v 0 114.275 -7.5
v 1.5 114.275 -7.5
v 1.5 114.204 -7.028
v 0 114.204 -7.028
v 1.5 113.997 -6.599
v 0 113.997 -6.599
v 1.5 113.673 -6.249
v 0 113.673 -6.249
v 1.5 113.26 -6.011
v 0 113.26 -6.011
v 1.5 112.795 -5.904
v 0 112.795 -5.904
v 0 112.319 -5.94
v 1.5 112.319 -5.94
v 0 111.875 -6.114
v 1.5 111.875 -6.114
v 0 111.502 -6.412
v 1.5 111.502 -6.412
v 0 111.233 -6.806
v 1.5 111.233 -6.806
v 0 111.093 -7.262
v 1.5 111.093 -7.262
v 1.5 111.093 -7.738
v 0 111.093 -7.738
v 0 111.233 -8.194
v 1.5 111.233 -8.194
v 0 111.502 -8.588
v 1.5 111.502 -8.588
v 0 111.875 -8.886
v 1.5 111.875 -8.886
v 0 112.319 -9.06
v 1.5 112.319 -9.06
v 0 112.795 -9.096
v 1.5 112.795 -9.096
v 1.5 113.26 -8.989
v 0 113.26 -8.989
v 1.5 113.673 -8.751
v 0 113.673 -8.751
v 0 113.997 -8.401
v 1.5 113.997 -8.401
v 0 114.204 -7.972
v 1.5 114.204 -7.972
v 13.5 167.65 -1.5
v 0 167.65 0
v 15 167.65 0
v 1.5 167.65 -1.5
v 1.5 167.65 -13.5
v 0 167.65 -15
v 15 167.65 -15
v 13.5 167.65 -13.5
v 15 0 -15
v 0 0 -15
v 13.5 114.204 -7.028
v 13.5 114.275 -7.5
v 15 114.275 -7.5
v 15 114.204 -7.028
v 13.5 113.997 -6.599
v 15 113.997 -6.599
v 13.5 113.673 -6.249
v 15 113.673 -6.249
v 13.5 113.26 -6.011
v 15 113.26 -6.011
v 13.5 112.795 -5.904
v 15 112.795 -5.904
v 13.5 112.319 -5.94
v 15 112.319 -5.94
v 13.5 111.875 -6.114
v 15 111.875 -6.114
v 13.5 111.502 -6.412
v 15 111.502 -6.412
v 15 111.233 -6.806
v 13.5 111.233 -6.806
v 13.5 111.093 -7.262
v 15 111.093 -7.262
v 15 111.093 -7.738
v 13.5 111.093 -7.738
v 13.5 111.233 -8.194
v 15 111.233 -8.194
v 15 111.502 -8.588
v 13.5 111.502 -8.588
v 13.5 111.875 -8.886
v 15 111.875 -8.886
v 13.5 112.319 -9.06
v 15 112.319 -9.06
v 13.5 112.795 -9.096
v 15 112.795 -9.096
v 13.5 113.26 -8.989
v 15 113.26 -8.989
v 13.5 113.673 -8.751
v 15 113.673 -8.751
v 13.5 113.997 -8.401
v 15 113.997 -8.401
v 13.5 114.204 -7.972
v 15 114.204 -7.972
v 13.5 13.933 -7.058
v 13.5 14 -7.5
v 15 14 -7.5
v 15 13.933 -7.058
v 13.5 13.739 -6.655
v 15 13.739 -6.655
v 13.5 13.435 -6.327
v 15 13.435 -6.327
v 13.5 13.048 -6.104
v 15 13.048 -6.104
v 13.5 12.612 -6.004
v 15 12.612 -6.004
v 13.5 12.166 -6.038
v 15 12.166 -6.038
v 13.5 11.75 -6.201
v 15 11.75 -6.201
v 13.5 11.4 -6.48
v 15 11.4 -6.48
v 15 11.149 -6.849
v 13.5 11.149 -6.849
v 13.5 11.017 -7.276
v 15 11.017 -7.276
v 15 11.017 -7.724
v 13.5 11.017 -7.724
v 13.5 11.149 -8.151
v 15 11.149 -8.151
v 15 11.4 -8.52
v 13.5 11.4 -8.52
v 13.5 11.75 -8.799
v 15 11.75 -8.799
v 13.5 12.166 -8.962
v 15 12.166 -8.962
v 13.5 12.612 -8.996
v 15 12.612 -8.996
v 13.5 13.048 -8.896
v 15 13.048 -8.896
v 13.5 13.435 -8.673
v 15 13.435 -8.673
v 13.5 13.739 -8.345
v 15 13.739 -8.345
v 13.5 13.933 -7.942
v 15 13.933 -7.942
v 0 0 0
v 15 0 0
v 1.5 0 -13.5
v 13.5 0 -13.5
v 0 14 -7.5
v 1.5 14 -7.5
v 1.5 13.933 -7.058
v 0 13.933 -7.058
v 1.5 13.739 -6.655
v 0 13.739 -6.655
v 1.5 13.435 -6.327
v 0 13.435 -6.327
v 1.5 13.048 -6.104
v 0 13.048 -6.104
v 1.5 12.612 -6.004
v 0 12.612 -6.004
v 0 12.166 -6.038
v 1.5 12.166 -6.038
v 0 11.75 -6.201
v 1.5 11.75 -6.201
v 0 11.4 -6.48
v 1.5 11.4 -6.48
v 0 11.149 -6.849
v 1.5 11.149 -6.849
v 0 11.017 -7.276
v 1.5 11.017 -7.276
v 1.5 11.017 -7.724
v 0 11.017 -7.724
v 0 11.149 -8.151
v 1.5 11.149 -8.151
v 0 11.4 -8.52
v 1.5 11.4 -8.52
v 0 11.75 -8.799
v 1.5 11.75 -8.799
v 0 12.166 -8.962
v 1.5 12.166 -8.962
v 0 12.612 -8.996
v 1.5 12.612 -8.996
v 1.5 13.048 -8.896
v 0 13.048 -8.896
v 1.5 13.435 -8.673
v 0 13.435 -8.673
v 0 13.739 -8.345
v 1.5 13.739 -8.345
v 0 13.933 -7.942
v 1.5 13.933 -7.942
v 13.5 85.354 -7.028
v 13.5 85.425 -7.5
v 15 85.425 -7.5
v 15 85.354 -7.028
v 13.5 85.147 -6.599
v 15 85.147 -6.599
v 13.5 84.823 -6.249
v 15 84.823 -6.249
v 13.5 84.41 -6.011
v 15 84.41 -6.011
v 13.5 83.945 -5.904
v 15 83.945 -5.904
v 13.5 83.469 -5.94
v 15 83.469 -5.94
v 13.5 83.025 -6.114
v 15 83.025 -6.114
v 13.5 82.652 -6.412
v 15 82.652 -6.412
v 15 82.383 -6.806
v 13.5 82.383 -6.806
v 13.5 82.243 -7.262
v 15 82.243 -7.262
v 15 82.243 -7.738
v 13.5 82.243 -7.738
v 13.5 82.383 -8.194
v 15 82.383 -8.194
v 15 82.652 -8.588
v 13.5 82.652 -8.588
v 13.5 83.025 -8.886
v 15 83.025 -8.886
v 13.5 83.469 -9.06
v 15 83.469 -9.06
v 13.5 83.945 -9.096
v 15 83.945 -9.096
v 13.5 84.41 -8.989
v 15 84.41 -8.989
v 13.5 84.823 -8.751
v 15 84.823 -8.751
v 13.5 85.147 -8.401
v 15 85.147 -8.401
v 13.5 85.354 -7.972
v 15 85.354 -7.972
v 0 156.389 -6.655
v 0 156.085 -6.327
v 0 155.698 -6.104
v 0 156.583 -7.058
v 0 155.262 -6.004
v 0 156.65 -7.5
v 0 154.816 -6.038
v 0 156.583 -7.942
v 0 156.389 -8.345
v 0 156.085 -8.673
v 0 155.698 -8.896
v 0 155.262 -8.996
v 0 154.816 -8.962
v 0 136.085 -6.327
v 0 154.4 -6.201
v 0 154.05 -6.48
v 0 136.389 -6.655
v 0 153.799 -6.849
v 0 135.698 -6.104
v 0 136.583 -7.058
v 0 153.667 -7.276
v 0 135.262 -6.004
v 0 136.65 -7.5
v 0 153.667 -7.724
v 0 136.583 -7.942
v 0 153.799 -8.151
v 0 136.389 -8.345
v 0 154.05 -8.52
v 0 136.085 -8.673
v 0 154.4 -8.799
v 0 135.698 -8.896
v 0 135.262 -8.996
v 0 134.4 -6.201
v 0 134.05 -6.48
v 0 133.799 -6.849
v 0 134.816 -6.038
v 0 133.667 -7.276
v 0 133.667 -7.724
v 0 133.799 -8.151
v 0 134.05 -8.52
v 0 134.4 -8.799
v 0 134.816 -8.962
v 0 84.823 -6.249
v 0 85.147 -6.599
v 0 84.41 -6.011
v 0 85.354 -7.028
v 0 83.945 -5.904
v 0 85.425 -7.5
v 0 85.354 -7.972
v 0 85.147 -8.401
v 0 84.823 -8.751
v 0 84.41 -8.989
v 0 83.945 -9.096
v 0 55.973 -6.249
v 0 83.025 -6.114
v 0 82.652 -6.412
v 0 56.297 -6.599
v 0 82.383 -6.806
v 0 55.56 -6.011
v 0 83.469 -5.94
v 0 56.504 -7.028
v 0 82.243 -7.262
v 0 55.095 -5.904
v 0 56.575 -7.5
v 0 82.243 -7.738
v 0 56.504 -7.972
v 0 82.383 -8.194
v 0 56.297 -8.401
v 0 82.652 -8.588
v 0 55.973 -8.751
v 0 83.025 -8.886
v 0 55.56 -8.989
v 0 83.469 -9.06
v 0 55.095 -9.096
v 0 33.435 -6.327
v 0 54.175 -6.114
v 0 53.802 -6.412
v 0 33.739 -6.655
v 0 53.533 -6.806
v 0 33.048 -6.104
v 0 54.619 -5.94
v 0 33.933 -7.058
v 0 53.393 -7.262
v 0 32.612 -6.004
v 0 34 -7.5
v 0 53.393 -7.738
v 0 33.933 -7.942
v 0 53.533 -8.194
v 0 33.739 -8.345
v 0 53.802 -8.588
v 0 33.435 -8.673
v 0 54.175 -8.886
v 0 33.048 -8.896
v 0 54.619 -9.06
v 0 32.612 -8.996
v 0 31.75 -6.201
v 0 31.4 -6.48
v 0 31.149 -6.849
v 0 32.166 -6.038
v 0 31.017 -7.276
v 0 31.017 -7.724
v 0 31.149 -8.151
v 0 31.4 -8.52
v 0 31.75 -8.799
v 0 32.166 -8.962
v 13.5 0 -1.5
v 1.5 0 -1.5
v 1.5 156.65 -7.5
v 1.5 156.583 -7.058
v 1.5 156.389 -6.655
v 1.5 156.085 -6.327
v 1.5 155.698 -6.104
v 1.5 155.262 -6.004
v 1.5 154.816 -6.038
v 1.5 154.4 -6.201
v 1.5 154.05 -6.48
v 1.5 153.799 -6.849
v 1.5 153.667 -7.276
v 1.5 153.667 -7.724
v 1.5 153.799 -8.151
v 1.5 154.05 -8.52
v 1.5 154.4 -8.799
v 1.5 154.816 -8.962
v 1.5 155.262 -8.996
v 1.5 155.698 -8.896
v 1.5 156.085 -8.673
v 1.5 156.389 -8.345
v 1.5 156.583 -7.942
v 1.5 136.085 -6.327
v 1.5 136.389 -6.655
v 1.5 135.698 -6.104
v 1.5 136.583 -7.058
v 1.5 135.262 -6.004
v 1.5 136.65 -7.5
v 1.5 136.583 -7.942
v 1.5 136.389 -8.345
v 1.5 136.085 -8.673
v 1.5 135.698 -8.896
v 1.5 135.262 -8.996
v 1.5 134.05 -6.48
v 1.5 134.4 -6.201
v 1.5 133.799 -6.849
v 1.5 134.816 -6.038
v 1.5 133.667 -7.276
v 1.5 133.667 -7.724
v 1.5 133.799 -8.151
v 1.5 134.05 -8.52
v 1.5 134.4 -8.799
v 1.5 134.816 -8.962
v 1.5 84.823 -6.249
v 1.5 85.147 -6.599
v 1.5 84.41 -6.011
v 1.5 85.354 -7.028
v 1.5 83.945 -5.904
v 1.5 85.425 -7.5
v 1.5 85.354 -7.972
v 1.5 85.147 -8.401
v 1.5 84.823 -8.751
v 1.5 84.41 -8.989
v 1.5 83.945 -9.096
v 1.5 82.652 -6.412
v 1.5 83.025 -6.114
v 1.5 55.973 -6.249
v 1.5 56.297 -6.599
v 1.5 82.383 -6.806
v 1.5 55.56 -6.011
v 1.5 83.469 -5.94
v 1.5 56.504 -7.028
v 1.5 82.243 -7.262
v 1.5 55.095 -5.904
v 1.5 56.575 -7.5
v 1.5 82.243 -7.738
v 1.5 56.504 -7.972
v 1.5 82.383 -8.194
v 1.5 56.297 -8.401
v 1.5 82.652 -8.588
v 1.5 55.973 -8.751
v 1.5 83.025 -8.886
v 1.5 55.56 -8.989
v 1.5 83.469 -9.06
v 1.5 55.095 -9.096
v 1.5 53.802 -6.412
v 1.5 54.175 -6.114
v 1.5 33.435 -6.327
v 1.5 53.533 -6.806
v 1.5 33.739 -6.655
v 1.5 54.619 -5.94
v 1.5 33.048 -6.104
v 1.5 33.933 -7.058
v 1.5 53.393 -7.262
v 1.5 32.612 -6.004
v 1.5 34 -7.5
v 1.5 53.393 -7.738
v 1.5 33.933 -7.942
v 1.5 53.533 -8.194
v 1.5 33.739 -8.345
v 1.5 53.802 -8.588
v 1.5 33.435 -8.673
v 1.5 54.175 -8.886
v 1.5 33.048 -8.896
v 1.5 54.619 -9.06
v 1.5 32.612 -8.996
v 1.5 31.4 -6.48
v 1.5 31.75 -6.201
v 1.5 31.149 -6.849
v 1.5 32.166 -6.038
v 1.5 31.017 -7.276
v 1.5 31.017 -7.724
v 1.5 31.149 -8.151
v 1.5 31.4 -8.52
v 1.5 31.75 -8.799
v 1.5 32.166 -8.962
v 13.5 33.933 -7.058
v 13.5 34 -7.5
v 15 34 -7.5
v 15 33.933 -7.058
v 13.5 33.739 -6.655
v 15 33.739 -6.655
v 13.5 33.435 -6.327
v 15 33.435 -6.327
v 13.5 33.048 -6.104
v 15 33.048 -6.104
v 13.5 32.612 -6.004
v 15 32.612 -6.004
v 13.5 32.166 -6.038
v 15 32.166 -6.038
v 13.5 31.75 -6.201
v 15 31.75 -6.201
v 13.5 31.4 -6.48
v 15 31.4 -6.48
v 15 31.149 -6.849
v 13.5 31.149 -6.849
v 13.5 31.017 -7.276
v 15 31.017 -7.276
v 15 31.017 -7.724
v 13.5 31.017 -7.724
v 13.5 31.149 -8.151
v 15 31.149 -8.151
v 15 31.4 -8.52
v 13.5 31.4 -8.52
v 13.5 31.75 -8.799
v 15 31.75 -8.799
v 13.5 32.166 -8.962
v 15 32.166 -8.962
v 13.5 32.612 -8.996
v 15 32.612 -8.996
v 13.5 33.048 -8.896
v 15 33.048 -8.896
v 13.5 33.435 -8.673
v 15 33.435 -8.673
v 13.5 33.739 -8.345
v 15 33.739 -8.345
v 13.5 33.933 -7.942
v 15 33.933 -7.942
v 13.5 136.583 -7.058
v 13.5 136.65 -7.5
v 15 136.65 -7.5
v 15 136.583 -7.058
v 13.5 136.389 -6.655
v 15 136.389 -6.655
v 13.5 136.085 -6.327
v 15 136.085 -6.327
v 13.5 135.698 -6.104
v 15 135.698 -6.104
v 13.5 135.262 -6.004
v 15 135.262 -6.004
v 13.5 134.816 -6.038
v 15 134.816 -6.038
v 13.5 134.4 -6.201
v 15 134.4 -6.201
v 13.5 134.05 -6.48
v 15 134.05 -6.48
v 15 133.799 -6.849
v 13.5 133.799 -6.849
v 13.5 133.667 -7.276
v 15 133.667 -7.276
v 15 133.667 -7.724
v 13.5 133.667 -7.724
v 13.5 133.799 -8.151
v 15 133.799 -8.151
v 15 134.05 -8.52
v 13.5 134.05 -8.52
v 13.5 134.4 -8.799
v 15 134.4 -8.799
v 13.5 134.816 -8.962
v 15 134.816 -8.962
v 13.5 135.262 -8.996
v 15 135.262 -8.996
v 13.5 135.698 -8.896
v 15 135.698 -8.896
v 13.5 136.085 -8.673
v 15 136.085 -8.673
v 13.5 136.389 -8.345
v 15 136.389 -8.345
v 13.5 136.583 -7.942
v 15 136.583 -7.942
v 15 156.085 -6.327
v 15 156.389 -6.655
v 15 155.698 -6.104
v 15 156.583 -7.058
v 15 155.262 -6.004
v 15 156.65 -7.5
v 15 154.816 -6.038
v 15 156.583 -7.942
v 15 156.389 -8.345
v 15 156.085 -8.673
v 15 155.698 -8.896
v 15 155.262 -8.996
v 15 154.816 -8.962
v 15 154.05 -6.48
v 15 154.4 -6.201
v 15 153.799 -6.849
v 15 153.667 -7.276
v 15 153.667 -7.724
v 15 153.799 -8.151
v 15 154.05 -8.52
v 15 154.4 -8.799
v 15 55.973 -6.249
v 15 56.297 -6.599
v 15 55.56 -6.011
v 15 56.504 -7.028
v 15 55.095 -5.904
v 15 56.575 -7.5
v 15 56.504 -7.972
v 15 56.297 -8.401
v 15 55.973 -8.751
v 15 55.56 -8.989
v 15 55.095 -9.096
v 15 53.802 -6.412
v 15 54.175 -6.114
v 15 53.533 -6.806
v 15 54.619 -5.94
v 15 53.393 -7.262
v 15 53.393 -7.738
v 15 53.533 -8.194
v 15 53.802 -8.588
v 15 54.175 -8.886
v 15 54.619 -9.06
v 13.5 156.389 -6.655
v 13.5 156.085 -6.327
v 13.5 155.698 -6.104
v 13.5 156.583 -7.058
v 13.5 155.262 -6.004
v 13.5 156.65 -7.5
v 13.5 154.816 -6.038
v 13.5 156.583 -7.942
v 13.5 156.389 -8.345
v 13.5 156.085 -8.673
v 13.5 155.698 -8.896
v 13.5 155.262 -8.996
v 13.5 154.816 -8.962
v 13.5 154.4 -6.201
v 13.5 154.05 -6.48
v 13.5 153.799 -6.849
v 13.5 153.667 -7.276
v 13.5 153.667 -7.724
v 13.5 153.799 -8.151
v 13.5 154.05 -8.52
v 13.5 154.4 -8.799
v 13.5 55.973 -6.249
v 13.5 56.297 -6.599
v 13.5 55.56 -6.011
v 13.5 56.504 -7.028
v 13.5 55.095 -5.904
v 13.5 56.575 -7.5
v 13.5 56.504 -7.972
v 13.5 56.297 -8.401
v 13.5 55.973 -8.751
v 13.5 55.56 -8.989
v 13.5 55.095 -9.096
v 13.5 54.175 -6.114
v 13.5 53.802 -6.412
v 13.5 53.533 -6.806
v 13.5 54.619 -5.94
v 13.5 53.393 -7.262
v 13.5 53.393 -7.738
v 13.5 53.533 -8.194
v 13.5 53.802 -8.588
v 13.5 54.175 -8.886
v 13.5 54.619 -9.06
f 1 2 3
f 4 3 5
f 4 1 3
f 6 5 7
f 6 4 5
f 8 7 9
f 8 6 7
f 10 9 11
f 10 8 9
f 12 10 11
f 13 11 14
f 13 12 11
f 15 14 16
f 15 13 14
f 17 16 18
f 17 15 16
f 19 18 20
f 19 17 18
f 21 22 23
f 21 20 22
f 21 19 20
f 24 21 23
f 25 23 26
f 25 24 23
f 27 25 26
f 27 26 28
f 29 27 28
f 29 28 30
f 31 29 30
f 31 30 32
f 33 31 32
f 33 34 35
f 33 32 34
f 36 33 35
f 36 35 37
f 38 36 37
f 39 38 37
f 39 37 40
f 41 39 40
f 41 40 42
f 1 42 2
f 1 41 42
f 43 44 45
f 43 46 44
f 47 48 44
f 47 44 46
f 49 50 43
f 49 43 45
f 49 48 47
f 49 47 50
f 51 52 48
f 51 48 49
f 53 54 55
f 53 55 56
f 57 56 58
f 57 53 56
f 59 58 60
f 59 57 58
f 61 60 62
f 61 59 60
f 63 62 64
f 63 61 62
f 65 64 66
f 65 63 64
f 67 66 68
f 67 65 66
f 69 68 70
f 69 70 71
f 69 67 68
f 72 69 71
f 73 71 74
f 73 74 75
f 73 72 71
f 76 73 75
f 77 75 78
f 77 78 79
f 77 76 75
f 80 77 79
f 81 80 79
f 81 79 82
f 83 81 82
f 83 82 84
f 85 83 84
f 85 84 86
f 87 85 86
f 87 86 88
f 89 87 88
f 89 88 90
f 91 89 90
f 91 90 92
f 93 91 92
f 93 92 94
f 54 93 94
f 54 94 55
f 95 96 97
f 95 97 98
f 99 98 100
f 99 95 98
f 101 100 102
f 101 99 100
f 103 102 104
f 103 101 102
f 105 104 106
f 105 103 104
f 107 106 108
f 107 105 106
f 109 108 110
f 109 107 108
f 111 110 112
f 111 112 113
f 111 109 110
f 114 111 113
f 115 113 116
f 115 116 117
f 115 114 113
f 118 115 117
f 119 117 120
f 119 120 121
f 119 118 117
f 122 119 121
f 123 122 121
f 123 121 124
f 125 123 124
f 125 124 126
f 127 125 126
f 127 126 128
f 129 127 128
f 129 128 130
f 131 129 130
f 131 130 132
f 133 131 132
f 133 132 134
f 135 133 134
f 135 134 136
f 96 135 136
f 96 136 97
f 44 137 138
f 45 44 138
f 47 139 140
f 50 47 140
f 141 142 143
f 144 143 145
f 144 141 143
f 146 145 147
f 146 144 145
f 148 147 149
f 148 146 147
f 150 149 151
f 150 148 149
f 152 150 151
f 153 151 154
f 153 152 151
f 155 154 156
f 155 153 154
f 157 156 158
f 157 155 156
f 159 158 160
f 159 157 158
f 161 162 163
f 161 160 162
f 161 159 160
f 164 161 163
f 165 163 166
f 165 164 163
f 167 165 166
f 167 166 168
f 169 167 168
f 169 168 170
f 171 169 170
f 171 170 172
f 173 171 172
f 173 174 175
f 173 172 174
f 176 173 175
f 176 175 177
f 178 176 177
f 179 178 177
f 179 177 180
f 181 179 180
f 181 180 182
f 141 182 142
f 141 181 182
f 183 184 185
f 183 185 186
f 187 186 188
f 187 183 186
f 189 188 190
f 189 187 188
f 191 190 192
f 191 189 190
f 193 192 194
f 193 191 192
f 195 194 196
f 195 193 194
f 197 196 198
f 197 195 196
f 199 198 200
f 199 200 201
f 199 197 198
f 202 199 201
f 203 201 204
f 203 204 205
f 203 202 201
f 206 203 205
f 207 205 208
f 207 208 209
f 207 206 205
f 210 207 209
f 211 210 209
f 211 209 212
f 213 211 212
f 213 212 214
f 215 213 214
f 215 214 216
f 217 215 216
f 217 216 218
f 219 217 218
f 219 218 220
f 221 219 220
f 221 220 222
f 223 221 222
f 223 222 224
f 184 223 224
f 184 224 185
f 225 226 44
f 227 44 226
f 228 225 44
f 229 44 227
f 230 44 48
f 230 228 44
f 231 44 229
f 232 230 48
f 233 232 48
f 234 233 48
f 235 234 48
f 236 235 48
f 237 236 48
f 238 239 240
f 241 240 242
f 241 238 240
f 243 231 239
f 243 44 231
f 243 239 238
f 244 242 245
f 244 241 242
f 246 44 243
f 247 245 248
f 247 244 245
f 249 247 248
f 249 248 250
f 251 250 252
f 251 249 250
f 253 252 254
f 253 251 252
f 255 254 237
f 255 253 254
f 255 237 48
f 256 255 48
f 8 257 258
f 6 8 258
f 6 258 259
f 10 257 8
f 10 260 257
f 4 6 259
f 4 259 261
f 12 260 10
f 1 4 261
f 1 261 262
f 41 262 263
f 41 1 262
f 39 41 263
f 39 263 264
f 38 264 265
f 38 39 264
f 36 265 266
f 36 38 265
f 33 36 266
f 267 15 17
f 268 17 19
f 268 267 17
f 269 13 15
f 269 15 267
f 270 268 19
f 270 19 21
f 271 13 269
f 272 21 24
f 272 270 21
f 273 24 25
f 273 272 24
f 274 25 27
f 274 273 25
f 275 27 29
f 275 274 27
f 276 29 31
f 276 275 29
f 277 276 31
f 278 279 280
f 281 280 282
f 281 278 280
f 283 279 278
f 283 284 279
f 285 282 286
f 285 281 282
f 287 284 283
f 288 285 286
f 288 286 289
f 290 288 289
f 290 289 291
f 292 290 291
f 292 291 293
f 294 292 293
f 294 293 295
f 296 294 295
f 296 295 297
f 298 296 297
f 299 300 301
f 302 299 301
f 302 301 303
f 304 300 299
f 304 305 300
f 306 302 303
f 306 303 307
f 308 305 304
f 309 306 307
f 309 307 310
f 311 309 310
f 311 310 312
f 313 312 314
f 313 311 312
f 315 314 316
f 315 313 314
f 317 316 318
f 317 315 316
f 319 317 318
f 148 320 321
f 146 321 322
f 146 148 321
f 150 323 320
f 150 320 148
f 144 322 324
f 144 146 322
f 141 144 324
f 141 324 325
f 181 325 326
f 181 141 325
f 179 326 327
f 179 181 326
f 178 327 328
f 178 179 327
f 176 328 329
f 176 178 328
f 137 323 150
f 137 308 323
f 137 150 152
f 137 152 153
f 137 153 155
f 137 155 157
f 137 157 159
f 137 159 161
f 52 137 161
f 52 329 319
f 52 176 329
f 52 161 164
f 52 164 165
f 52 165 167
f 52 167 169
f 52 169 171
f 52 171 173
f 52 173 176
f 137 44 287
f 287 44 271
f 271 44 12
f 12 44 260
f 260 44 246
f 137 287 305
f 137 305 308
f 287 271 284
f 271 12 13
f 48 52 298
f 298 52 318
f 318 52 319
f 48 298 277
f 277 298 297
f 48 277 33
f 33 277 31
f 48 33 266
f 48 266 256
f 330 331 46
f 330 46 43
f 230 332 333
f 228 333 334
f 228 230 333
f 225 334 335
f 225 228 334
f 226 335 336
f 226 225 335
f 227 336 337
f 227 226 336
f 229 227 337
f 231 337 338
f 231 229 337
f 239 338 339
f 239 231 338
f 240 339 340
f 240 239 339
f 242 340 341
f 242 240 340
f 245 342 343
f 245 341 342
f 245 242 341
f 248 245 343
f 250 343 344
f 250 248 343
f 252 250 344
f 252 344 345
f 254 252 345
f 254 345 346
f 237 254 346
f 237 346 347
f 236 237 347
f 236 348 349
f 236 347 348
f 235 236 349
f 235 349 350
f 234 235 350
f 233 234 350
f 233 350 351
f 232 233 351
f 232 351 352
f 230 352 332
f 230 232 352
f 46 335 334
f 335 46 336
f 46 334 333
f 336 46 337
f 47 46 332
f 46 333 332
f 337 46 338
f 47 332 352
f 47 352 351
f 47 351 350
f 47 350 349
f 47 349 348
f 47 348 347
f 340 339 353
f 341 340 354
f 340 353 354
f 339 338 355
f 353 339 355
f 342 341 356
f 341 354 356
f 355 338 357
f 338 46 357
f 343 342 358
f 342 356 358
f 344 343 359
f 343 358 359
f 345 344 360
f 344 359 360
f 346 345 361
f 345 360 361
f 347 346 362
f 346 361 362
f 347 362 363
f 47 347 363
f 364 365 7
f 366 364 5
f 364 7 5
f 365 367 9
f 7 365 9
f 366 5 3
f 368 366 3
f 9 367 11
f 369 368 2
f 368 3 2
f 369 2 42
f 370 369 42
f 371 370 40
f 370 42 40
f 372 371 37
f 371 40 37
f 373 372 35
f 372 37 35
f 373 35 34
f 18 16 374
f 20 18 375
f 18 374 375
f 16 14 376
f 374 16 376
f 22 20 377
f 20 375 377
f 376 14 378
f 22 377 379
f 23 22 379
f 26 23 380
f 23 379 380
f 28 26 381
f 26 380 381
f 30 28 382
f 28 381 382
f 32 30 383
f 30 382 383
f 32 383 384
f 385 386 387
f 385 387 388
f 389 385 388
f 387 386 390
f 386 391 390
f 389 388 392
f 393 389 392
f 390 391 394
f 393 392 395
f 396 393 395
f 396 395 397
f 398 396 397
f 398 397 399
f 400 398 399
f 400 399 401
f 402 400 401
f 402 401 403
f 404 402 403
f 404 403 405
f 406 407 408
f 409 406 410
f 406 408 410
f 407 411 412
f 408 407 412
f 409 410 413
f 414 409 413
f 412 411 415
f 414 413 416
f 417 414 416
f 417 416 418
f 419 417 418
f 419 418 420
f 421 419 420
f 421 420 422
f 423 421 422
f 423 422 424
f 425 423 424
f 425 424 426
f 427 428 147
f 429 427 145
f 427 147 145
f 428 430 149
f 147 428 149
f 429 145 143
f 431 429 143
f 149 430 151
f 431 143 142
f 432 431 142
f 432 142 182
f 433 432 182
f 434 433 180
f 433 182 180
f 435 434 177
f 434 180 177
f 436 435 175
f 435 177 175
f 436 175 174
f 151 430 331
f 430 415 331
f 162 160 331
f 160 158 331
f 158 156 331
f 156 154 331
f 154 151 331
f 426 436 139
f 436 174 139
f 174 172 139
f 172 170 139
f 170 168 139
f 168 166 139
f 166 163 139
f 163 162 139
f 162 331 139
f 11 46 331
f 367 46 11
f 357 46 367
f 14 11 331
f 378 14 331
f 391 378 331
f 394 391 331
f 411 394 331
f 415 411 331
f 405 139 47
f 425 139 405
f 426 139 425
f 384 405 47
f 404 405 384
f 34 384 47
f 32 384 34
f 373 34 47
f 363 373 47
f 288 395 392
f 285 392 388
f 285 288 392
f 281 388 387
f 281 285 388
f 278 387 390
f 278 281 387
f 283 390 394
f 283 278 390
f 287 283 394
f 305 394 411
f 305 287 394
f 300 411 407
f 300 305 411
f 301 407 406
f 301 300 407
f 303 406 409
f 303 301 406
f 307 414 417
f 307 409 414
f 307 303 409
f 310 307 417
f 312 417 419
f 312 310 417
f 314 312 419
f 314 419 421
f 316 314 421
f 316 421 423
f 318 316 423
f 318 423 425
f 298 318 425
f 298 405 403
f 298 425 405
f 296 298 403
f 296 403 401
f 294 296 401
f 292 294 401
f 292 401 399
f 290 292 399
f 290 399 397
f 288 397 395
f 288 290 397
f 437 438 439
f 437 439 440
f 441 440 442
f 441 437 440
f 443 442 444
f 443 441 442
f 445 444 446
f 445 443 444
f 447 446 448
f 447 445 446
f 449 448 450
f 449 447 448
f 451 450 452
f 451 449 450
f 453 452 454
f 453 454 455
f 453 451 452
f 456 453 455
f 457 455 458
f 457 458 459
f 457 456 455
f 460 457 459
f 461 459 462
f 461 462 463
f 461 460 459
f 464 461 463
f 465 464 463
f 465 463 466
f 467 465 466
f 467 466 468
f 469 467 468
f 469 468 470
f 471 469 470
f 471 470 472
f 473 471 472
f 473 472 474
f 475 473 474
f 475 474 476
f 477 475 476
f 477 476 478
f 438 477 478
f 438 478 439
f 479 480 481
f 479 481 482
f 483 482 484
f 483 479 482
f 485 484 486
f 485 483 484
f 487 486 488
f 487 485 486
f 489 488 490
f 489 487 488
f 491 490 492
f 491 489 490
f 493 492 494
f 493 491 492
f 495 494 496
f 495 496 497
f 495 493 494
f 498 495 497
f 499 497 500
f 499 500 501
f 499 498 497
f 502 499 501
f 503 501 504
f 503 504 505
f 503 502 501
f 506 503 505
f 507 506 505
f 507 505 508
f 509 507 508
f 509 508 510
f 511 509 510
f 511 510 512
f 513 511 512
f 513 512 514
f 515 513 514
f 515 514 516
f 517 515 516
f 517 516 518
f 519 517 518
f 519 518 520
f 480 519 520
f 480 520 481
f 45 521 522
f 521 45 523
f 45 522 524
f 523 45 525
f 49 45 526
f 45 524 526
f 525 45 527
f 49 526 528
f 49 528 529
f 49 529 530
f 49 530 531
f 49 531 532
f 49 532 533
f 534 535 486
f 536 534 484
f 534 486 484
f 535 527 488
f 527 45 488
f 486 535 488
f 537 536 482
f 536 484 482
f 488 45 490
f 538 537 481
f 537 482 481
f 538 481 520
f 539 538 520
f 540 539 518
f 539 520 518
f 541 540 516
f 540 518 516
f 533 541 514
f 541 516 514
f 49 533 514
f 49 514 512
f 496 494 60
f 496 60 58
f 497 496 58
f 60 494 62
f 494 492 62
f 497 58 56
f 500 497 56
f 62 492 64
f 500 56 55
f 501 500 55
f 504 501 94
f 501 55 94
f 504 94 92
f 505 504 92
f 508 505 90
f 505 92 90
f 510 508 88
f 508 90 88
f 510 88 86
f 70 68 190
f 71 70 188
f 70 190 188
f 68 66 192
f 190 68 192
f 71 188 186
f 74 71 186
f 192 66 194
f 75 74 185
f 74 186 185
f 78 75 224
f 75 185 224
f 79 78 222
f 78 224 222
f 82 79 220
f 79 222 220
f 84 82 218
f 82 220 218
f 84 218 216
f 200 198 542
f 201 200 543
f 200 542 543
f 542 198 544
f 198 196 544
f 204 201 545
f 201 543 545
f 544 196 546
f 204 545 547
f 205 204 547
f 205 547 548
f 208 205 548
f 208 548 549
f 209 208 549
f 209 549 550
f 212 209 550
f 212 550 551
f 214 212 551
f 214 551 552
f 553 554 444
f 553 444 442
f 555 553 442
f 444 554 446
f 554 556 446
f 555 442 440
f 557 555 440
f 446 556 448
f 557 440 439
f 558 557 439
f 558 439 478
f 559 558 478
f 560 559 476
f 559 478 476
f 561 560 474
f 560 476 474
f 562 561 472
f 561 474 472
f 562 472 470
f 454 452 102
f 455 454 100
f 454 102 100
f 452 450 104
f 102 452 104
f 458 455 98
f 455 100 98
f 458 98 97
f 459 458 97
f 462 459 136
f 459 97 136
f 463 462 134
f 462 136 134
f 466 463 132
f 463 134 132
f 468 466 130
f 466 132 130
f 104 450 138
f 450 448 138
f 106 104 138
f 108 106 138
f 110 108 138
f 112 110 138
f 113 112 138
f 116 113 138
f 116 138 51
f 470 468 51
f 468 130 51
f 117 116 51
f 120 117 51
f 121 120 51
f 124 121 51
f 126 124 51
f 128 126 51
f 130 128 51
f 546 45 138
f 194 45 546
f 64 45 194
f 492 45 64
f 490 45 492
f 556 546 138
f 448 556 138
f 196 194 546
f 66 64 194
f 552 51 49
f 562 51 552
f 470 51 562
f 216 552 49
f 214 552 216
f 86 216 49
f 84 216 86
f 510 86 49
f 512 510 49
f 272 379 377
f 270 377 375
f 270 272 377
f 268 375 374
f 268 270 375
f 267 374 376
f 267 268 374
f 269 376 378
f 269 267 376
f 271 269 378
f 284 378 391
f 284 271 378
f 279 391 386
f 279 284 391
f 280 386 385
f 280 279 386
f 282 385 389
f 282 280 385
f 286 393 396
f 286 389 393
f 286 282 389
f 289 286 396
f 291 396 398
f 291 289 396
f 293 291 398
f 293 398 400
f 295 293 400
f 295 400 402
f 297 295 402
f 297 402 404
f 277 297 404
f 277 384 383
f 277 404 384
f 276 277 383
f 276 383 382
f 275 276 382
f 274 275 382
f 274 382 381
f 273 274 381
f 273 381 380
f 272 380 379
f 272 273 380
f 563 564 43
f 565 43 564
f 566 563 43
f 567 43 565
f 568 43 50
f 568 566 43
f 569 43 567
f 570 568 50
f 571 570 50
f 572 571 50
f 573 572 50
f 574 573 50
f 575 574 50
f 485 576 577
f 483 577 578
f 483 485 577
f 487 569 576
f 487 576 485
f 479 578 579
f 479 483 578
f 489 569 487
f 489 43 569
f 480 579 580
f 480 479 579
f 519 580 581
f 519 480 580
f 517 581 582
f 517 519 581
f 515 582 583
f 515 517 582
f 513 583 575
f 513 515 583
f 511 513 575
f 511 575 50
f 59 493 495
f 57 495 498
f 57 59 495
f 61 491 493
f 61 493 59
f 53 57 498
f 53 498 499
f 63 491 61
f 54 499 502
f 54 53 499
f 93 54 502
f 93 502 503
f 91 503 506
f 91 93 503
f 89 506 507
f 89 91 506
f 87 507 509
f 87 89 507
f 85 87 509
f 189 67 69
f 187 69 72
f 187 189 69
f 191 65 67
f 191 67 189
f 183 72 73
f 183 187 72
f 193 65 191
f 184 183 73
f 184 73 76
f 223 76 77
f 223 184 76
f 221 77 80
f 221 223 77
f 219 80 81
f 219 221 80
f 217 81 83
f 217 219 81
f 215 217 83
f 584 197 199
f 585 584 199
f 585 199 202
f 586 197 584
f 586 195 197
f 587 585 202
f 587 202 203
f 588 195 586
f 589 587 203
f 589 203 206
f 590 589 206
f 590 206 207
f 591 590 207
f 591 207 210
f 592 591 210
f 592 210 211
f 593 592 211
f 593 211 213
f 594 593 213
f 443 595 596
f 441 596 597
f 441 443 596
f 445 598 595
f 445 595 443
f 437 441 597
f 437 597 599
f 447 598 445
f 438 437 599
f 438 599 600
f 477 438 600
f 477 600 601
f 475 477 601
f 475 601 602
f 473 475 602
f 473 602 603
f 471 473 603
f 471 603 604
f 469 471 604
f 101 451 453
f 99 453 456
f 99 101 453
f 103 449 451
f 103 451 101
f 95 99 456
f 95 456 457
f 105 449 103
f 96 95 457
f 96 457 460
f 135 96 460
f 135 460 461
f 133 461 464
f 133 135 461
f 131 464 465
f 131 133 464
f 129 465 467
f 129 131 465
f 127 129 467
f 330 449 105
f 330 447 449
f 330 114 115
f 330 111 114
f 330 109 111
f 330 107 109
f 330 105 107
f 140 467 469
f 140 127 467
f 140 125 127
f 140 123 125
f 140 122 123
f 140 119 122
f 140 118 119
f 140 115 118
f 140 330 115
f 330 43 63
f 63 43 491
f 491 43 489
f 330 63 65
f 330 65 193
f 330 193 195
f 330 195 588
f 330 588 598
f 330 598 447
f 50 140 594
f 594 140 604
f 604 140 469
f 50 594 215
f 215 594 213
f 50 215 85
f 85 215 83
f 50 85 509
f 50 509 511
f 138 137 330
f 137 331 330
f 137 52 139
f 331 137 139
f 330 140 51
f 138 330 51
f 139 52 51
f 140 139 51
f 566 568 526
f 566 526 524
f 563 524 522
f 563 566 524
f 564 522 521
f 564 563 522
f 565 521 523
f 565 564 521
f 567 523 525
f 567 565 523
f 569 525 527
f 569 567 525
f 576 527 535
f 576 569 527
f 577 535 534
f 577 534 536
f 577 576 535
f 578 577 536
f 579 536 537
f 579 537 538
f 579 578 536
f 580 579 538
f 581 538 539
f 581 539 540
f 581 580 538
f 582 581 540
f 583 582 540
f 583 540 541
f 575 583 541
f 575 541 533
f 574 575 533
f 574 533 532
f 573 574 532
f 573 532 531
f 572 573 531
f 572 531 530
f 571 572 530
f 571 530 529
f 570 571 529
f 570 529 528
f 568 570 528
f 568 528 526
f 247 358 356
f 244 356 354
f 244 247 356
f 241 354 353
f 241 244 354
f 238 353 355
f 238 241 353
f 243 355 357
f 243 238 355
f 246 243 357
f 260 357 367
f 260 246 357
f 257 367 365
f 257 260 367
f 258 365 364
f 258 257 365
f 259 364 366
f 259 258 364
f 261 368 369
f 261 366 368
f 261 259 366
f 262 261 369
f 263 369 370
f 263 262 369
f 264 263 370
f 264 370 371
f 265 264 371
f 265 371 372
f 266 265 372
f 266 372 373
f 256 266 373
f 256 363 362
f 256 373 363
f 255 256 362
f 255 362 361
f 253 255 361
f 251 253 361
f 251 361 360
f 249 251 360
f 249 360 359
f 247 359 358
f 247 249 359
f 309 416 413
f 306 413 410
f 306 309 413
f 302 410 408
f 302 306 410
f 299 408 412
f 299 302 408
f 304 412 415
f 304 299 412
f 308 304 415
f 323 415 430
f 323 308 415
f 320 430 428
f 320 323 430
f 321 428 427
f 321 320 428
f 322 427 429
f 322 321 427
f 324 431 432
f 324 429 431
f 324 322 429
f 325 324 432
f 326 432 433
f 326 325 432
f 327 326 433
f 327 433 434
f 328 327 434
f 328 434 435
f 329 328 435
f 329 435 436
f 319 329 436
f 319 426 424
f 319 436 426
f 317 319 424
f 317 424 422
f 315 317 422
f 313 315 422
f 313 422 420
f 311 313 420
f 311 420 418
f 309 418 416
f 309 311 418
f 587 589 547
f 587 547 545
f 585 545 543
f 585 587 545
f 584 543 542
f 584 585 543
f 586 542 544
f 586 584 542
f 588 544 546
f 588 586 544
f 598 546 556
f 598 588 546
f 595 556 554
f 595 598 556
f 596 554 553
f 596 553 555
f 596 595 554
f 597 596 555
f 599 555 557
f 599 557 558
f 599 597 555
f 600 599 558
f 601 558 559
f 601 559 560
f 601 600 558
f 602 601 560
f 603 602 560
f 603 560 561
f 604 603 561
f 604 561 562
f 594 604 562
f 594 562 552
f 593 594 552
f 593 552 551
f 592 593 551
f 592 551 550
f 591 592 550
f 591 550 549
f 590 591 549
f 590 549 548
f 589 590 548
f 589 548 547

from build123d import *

# Parameters (mm, degrees)
SKETCH_1_W                = 15
SKETCH_1_H                = 15
SKETCH_1_W_2              = 12
SKETCH_1_H_2              = 12
EXTRUDE_1_DEPTH           = 167.65
CUT_EXTRUDE_1_OUTLINE_R   = 1.5
CUT_EXTRUDE_1_OUTLINE_R_2 = 1.6
CUT_EXTRUDE_1_DEPTH       = 15


# Read off the part's stored shape, not the designer's step: 切除-拉伸1
with BuildPart() as part:
    # 草图1 → 凸台-拉伸1 (new body)
    with BuildSketch(Plane(origin=(0, 0, 0), x_dir=(1, 0, 0), z_dir=(0, 1, 0))):
        with Locations((7.5, 7.5)):
            Rectangle(SKETCH_1_W, SKETCH_1_H)
        with Locations((7.5, 7.5)):
            Rectangle(SKETCH_1_W_2, SKETCH_1_H_2, mode=Mode.SUBTRACT)
    extrude(amount=EXTRUDE_1_DEPTH)

    # 切除-拉伸1 outline → 切除-拉伸1 (cut)
    with BuildSketch(Plane.YZ):
        with Locations((12.5, -7.5)):
            Circle(CUT_EXTRUDE_1_OUTLINE_R)
        with Locations((32.5, -7.5)):
            Circle(CUT_EXTRUDE_1_OUTLINE_R)
        with Locations((54.975, -7.5)):
            Circle(CUT_EXTRUDE_1_OUTLINE_R_2)
        with Locations((83.825, -7.5)):
            Circle(CUT_EXTRUDE_1_OUTLINE_R_2)
        with Locations((112.675, -7.5)):
            Circle(CUT_EXTRUDE_1_OUTLINE_R_2)
        with Locations((135.15, -7.5)):
            Circle(CUT_EXTRUDE_1_OUTLINE_R)
        with Locations((155.15, -7.5)):
            Circle(CUT_EXTRUDE_1_OUTLINE_R)
    extrude(amount=CUT_EXTRUDE_1_DEPTH, mode=Mode.SUBTRACT)


solid = part.part
